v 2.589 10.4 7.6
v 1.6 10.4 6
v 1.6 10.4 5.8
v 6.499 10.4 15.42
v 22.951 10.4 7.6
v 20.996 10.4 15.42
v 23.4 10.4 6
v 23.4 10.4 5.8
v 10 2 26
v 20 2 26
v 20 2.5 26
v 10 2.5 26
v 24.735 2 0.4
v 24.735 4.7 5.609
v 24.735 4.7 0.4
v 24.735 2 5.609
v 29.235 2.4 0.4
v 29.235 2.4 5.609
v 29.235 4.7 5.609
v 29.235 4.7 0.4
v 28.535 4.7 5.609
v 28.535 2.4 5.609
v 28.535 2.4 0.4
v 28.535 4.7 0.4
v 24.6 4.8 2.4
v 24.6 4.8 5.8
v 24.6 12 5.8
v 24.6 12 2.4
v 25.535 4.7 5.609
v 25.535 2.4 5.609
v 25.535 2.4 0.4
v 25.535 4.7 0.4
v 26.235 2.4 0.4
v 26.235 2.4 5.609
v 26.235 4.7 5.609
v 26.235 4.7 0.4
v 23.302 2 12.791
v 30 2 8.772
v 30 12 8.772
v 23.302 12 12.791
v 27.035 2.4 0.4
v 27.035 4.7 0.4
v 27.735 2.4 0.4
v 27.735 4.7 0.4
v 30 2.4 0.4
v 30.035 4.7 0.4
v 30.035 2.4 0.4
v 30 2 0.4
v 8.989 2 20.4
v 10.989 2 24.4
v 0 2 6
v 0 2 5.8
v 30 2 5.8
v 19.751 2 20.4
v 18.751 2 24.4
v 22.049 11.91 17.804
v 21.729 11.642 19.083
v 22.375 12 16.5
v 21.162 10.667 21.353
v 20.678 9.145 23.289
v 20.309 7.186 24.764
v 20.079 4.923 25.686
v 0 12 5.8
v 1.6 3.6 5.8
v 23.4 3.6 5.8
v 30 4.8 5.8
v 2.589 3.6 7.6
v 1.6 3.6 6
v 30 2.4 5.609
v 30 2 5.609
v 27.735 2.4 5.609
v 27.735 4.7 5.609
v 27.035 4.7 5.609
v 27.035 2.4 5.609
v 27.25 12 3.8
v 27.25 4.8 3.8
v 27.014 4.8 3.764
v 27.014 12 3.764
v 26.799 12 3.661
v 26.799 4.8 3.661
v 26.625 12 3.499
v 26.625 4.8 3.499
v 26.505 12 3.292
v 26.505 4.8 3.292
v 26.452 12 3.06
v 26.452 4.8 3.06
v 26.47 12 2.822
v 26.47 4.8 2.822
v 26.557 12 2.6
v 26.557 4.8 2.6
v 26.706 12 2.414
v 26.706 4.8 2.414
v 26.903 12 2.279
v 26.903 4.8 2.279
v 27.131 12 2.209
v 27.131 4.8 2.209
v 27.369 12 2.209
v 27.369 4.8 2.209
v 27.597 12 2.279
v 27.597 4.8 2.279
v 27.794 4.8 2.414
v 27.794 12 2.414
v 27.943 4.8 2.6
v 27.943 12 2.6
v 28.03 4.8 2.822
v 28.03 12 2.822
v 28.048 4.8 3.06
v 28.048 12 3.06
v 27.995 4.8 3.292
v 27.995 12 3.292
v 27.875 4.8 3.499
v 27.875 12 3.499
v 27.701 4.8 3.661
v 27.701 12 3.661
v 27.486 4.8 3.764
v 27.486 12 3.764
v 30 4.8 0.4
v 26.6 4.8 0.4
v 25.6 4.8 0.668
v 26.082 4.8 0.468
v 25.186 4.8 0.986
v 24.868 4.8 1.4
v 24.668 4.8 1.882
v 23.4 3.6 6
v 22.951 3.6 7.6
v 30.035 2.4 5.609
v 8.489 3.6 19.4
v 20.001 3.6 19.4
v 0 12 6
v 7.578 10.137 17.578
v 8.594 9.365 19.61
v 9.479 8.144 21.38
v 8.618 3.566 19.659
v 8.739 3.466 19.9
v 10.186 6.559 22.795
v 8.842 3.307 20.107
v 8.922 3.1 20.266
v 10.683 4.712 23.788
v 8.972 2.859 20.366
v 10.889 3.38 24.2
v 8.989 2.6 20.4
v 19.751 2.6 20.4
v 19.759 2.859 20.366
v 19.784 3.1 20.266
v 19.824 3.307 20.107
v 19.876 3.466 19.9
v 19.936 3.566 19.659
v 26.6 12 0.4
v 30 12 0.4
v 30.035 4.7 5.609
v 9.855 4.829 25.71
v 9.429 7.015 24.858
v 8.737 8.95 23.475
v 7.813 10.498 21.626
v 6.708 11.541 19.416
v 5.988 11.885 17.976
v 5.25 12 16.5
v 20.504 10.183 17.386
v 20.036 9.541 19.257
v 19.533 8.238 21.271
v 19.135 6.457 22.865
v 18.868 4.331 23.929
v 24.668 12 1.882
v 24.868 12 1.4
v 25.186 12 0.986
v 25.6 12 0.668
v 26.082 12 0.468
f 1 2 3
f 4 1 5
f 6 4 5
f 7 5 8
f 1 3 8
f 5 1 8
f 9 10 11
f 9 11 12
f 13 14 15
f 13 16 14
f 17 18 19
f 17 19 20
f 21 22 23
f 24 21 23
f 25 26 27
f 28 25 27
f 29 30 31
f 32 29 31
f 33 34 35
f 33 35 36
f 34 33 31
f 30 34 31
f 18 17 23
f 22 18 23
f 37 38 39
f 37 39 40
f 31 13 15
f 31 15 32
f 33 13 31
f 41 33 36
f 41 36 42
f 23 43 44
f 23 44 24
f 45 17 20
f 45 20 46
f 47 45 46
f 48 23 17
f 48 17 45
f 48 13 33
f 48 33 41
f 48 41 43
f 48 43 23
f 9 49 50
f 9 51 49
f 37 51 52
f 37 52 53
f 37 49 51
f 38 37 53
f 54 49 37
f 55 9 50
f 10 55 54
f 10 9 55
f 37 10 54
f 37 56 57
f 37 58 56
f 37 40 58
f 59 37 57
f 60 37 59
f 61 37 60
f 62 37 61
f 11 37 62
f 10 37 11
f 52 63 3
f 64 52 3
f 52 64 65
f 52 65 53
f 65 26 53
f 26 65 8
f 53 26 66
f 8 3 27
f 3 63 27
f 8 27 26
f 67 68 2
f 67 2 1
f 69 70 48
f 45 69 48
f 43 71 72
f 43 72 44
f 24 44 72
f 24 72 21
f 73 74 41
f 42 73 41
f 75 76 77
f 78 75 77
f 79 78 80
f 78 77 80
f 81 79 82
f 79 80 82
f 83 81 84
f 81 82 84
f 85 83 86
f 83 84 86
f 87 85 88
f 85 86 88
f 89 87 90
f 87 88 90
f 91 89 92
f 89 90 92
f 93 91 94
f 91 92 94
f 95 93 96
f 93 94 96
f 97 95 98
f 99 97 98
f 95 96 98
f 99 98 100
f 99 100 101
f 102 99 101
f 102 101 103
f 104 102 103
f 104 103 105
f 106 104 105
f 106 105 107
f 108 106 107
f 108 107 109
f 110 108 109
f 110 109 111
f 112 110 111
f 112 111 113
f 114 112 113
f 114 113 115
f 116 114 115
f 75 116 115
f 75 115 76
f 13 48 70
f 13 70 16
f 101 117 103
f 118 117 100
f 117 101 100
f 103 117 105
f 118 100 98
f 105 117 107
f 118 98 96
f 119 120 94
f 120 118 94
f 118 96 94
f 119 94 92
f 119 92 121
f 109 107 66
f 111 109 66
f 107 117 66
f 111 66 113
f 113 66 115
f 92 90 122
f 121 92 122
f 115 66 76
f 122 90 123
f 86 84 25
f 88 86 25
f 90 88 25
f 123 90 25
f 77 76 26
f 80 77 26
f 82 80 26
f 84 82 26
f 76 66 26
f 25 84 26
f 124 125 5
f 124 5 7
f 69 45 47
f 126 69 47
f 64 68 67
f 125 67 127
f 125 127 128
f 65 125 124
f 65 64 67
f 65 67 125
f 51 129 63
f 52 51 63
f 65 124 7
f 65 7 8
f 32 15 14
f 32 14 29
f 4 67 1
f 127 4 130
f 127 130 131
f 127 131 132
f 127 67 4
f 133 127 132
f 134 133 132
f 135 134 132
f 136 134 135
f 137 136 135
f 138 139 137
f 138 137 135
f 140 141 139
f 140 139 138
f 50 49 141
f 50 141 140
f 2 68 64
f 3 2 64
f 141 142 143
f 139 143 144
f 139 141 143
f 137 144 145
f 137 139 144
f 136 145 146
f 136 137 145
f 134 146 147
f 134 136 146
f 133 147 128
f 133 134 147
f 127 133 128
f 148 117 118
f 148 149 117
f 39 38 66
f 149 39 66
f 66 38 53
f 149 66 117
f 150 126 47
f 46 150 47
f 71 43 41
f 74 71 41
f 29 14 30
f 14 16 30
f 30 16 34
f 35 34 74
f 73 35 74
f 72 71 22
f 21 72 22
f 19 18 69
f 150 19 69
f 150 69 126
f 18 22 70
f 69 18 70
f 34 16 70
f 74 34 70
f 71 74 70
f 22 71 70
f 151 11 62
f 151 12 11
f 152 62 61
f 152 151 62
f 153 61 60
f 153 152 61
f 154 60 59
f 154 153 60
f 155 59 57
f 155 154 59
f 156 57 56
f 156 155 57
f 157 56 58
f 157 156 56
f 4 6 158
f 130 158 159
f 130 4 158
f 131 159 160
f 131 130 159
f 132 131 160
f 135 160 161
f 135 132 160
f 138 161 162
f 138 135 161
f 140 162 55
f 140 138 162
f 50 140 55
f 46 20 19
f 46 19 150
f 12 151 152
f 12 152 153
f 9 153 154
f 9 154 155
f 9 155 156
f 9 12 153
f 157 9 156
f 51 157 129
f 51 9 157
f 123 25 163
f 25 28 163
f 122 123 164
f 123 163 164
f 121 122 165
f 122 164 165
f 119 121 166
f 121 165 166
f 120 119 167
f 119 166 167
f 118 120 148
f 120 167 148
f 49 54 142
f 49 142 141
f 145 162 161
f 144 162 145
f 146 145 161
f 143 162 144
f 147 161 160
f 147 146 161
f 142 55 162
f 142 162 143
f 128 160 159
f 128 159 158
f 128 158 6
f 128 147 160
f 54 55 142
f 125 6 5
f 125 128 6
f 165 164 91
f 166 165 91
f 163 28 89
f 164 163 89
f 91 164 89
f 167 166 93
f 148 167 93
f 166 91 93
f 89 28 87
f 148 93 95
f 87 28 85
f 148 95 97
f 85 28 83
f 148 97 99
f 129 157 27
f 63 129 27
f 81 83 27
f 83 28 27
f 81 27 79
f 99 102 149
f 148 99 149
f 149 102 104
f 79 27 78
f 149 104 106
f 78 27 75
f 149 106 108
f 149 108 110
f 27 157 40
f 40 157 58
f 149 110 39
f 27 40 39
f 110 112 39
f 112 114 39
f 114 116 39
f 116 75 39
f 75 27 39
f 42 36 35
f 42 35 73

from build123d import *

# Parameters (mm, degrees)
SKETCH_1_W          = 30
SKETCH_1_H          = 6
EXTRUDE_1_DEPTH     = 2
SKETCH_2_R          = 0.8
CUT_EXTRUDE_1_DEPTH = 2
SKETCH_3_W          = 1.6
SKETCH_3_H          = 0.2
EXTRUDE_2_DEPTH     = 10
SKETCH_4_W          = 21.8
SKETCH_4_H          = 0.2
EXTRUDE_3_DEPTH     = 1.6
SKETCH_5_W          = 5
SKETCH_5_H          = 0.2
EXTRUDE_4_DEPTH     = 10
SKETCH_6_W          = 5.4
SKETCH_6_H          = 7.2
EXTRUDE_5_DEPTH     = 5.4
FILLET_1_R          = 2
SKETCH_7_R          = 0.8
CUT_EXTRUDE_2_DEPTH = 32.429922049
SKETCH_8_W          = 6
SKETCH_8_H          = 2
CUT_EXTRUDE_3_DEPTH = 33.86335345
SKETCH_9_W          = 21.8
SKETCH_9_H          = 1.6
EXTRUDE_7_DEPTH     = 0.2
EXTRUDE_9_DEPTH     = 1.6
EXTRUDE_10_REACH    = 42.578
EXTRUDE_11_DEPTH    = 1.6
CUT_EXTRUDE_4_DEPTH = 1.6
FILLET_2_R          = 9
FILLET_3_R          = 9.5
FILLET_4_R          = 1
CHAMFER_1_SIZE      = 9.620579793
CHAMFER_1_SIZE_2    = 7
SKETCH_16_W         = 5.26536988
SKETCH_16_H         = 5.208629253
EXTRUDE_12_DEPTH    = 0.4
SKETCH_17_W         = 0.8
SKETCH_17_H         = 5.208629253
EXTRUDE_13_DEPTH    = 2.3


with BuildPart() as part:
    # 草图1 → 凸台-拉伸1 (new body)
    with BuildSketch(Plane(origin=(0, 0, 0), x_dir=(1, 0, 0), z_dir=(0, 1, 0))):
        with Locations((15, -3)):
            Rectangle(SKETCH_1_W, SKETCH_1_H)
    extrude(amount=EXTRUDE_1_DEPTH)

    # 草图2 → 切除-拉伸1 (cut)
    with BuildSketch(Plane(origin=(0, 2, 0), x_dir=(1, 0, 0), z_dir=(0, 1, 0))):
        with Locations(Location((27.25, -3, 0), (0, 0, 270))):
            Circle(SKETCH_2_R)
    extrude(amount=-CUT_EXTRUDE_1_DEPTH, mode=Mode.SUBTRACT)

    # 草图3 → 凸台-拉伸2 (add)
    with BuildSketch(Plane(origin=(0, 2, 0), x_dir=(1, 0, 0), z_dir=(0, 1, 0))):
        with Locations((0.8, -5.9)):
            Rectangle(SKETCH_3_W, SKETCH_3_H)
        with Locations((24.2, -5.9)):
            Rectangle(SKETCH_3_W, SKETCH_3_H)
    extrude(amount=EXTRUDE_2_DEPTH)

    # 草图4 → 凸台-拉伸3 (add)
    with BuildSketch(Plane(origin=(0, 12, 0), x_dir=(1, 0, 0), z_dir=(0, 1, 0))):
        with Locations((12.5, -5.9)):
            Rectangle(SKETCH_4_W, SKETCH_4_H)
    extrude(amount=-EXTRUDE_3_DEPTH)

    # 草图5 → 凸台-拉伸4 (add)
    with BuildSketch(Plane(origin=(0, 2, 0), x_dir=(1, 0, 0), z_dir=(0, 1, 0))):
        with Locations((27.5, -5.9)):
            Rectangle(SKETCH_5_W, SKETCH_5_H)
    extrude(amount=EXTRUDE_4_DEPTH)

    # 草图6 → 凸台-拉伸5 (add)
    with BuildSketch(Plane(origin=(0, 0, 5.8), x_dir=(-1, 0, 0), z_dir=(0, 0, -1))):
        with Locations((-27.3, 8.4)):
            Rectangle(SKETCH_6_W, SKETCH_6_H)
    extrude(amount=EXTRUDE_5_DEPTH)

    # 圆角1
    fillet_1_edges = [part.edges().sort_by_distance(p)[0] for p in [
        (24.6, 8.4, 0.4),
    ]]
    fillet(fillet_1_edges, radius=FILLET_1_R)

    # 草图7 → 切除-拉伸2 (cut, through all)
    with BuildSketch(Plane(origin=(0, 4.8, 0), x_dir=(-1, 0, 0), z_dir=(0, -1, 0))):
        with Locations(Location((-27.25, -3, 0), (0, 0, 270))):
            Circle(SKETCH_7_R)
    extrude(amount=-CUT_EXTRUDE_2_DEPTH, mode=Mode.SUBTRACT)

    # 草图8 → 切除-拉伸3 (cut, through all)
    with BuildSketch(Plane.ZY):
        with Locations((3, 1)):
            Rectangle(SKETCH_8_W, SKETCH_8_H)
    extrude(amount=-CUT_EXTRUDE_3_DEPTH, mode=Mode.SUBTRACT)

    # 草图9 → 凸台-拉伸7 (add)
    with BuildSketch(Plane.XY.offset(6)):
        with Locations((12.5, 2.8)):
            Rectangle(SKETCH_9_W, SKETCH_9_H)
    extrude(amount=-EXTRUDE_7_DEPTH)

    # 草图11 → 凸台-拉伸9 (add)
    with BuildSketch(Plane(origin=(0, 2, 0), x_dir=(-1, 0, 0), z_dir=(0, -1, 0))):
        Polygon((0, -6), (-10, -26), (-20, -26), (-25, -6), align=None)
    extrude(amount=-EXTRUDE_9_DEPTH)

    # 凸台-拉伸10: up to this face of the body (flat: up to its plane)
    extrude_10_end = Plane(part.part.faces().sort_by_distance((25.077544524, 12, 3.686395467))[0])
    # 草图12 → 凸台-拉伸10 (add, up to the picked face)
    with BuildSketch(Plane(origin=(0, 3.6, 0), x_dir=(1, 0, 0), z_dir=(0, 1, 0)), mode=Mode.PRIVATE) as extrude_10_sk1:
        Polygon((2.588854382, -7.6), (10.988854382, -24.4), (18.75075775, -24.4), (22.95075775, -7.6), (23.4, -6), (25, -6), (20, -26), (10, -26), (0, -6), (1.6, -6), align=None)
    extrude_10_tool1 = split(extrude(extrude_10_sk1.sketch, amount=EXTRUDE_10_REACH, mode=Mode.PRIVATE), bisect_by=extrude_10_end, keep=Keep.BOTH, mode=Mode.PRIVATE)
    add(extrude_10_tool1.solids().sort_by(Axis((6.502498, 3.6, 16.143178), (0, 1, 0)))[0])

    # 草图13 → 凸台-拉伸11 (add)
    with BuildSketch(Plane(origin=(0, 12, 0), x_dir=(1, 0, 0), z_dir=(0, 1, 0))):
        Polygon((1.6, -5.8), (1.6, -6), (2.588854382, -7.6), (10.988854382, -24.4), (18.75075775, -24.4), (22.95075775, -7.6), (23.4, -6), (23.4, -5.8), align=None)
    extrude(amount=-EXTRUDE_11_DEPTH)

    # 草图15 → 切除-拉伸4 (cut)
    with BuildSketch(Plane.XZ.offset(-2)):
        Polygon((10.988854382, 24.4), (18.75075775, 24.4), (19.75075775, 20.4), (8.988854382, 20.4), align=None)
    extrude(amount=-CUT_EXTRUDE_4_DEPTH, mode=Mode.SUBTRACT)

    # 圆角2
    # the kernel refuses this fillet: 9 mm, written as the material it adds along each edge
    with BuildSketch(Plane(origin=(-11.461089939, 10.4, 24.4), x_dir=(0, -1, 0), z_dir=(1, 0, 0))) as fillet_2_piece_1_section:
        with BuildLine():
            CenterArc((9, 8.979977728), FILLET_2_R, 180, 86.177446271)
            Line((0, 8.979977728), (-0.18, 8.979977728))
            Line((-0.18, 8.979977728), (-0.18, 0))
            Line((-0.18, 0), (0, -0.18))
            ThreePointArc((0, -0.18), (4.2, -0.18), (8.388, -0.179599555))
            Line((8.388, -0.179599555), (8.4, 0))
        make_face()
    fillet_2_piece_1 = extrude(amount=52.661792009, mode=Mode.PRIVATE)
    fillet_2_piece_1 = split(fillet_2_piece_1, bisect_by=Plane(origin=(10.765391635, 8.588071481, 23.953074506), z_dir=(0.8944271909999129, 0, -0.447213595499964)), keep=Keep.TOP, mode=Mode.PRIVATE)
    fillet_2_piece_1 = split(fillet_2_piece_1, bisect_by=Plane(origin=(19.058612592, 8.588071481, 23.168580631), z_dir=(-0.9701425001453267, 0, -0.24253562503635406)), keep=Keep.TOP, mode=Mode.PRIVATE)
    add(fillet_2_piece_1)

    # 圆角3
    fillet_3_edges = [part.edges().sort_by_distance(p)[0] for p in [
        (15, 12, 26),
    ]]
    fillet(fillet_3_edges, radius=FILLET_3_R)

    # 圆角4
    fillet_4_edges = [part.edges().sort_by_distance(p)[0] for p in [
        (14.369806066, 3.6, 20.4),
    ]]
    fillet(fillet_4_edges, radius=FILLET_4_R)

    # 倒角1
    # the kernel refuses this chamfer: 9.620579793, 7 mm, written as the material it adds along each edge
    with BuildSketch(Plane(origin=(25, 12, 6), x_dir=(0.9998021063601228, 0, -0.019893418958582616), z_dir=(0, -1, 0))) as chamfer_1_piece_1_section:
        Polygon((CHAMFER_1_SIZE * 0.999802106371, CHAMFER_1_SIZE * 0.0198934189588), (-CHAMFER_1_SIZE_2 * 0.261787079984, CHAMFER_1_SIZE_2 * 0.965125652314), (0, 0), align=None)
    chamfer_1_piece_1 = extrude(amount=10, mode=Mode.PRIVATE)
    chamfer_1_piece_1 = split(chamfer_1_piece_1, bisect_by=Plane(origin=(30, 7, 8.595881011), z_dir=(-1, 0, 0)), keep=Keep.TOP, mode=Mode.PRIVATE)
    add(chamfer_1_piece_1)


with BuildPart() as body_2:
    # 草图16 → 凸台-拉伸12 (new body)
    with BuildSketch(Plane(origin=(0, 2, 0), x_dir=(-1, 0, 0), z_dir=(0, -1, 0))):
        with Locations((-27.36731506, -3.004314627)):
            Rectangle(SKETCH_16_W, SKETCH_16_H)
    extrude(amount=-EXTRUDE_12_DEPTH)

    # 草图17 → 凸台-拉伸13 (add)
    with BuildSketch(Plane(origin=(0, 2.4, 0), x_dir=(1, 0, 0), z_dir=(0, 1, 0))):
        with Locations((25.13463012, -3.004314627)):
            Rectangle(SKETCH_17_W, SKETCH_17_H)
        with Locations((26.63463012, -3.004314627)):
            Rectangle(SKETCH_17_W, SKETCH_17_H)
        with Locations((28.13463012, -3.004314627)):
            Rectangle(SKETCH_17_W, SKETCH_17_H)
        with Locations((29.63463012, -3.004314627)):
            Rectangle(SKETCH_17_W, SKETCH_17_H)
    extrude(amount=EXTRUDE_13_DEPTH)


solid = Compound([part.part, body_2.part])
